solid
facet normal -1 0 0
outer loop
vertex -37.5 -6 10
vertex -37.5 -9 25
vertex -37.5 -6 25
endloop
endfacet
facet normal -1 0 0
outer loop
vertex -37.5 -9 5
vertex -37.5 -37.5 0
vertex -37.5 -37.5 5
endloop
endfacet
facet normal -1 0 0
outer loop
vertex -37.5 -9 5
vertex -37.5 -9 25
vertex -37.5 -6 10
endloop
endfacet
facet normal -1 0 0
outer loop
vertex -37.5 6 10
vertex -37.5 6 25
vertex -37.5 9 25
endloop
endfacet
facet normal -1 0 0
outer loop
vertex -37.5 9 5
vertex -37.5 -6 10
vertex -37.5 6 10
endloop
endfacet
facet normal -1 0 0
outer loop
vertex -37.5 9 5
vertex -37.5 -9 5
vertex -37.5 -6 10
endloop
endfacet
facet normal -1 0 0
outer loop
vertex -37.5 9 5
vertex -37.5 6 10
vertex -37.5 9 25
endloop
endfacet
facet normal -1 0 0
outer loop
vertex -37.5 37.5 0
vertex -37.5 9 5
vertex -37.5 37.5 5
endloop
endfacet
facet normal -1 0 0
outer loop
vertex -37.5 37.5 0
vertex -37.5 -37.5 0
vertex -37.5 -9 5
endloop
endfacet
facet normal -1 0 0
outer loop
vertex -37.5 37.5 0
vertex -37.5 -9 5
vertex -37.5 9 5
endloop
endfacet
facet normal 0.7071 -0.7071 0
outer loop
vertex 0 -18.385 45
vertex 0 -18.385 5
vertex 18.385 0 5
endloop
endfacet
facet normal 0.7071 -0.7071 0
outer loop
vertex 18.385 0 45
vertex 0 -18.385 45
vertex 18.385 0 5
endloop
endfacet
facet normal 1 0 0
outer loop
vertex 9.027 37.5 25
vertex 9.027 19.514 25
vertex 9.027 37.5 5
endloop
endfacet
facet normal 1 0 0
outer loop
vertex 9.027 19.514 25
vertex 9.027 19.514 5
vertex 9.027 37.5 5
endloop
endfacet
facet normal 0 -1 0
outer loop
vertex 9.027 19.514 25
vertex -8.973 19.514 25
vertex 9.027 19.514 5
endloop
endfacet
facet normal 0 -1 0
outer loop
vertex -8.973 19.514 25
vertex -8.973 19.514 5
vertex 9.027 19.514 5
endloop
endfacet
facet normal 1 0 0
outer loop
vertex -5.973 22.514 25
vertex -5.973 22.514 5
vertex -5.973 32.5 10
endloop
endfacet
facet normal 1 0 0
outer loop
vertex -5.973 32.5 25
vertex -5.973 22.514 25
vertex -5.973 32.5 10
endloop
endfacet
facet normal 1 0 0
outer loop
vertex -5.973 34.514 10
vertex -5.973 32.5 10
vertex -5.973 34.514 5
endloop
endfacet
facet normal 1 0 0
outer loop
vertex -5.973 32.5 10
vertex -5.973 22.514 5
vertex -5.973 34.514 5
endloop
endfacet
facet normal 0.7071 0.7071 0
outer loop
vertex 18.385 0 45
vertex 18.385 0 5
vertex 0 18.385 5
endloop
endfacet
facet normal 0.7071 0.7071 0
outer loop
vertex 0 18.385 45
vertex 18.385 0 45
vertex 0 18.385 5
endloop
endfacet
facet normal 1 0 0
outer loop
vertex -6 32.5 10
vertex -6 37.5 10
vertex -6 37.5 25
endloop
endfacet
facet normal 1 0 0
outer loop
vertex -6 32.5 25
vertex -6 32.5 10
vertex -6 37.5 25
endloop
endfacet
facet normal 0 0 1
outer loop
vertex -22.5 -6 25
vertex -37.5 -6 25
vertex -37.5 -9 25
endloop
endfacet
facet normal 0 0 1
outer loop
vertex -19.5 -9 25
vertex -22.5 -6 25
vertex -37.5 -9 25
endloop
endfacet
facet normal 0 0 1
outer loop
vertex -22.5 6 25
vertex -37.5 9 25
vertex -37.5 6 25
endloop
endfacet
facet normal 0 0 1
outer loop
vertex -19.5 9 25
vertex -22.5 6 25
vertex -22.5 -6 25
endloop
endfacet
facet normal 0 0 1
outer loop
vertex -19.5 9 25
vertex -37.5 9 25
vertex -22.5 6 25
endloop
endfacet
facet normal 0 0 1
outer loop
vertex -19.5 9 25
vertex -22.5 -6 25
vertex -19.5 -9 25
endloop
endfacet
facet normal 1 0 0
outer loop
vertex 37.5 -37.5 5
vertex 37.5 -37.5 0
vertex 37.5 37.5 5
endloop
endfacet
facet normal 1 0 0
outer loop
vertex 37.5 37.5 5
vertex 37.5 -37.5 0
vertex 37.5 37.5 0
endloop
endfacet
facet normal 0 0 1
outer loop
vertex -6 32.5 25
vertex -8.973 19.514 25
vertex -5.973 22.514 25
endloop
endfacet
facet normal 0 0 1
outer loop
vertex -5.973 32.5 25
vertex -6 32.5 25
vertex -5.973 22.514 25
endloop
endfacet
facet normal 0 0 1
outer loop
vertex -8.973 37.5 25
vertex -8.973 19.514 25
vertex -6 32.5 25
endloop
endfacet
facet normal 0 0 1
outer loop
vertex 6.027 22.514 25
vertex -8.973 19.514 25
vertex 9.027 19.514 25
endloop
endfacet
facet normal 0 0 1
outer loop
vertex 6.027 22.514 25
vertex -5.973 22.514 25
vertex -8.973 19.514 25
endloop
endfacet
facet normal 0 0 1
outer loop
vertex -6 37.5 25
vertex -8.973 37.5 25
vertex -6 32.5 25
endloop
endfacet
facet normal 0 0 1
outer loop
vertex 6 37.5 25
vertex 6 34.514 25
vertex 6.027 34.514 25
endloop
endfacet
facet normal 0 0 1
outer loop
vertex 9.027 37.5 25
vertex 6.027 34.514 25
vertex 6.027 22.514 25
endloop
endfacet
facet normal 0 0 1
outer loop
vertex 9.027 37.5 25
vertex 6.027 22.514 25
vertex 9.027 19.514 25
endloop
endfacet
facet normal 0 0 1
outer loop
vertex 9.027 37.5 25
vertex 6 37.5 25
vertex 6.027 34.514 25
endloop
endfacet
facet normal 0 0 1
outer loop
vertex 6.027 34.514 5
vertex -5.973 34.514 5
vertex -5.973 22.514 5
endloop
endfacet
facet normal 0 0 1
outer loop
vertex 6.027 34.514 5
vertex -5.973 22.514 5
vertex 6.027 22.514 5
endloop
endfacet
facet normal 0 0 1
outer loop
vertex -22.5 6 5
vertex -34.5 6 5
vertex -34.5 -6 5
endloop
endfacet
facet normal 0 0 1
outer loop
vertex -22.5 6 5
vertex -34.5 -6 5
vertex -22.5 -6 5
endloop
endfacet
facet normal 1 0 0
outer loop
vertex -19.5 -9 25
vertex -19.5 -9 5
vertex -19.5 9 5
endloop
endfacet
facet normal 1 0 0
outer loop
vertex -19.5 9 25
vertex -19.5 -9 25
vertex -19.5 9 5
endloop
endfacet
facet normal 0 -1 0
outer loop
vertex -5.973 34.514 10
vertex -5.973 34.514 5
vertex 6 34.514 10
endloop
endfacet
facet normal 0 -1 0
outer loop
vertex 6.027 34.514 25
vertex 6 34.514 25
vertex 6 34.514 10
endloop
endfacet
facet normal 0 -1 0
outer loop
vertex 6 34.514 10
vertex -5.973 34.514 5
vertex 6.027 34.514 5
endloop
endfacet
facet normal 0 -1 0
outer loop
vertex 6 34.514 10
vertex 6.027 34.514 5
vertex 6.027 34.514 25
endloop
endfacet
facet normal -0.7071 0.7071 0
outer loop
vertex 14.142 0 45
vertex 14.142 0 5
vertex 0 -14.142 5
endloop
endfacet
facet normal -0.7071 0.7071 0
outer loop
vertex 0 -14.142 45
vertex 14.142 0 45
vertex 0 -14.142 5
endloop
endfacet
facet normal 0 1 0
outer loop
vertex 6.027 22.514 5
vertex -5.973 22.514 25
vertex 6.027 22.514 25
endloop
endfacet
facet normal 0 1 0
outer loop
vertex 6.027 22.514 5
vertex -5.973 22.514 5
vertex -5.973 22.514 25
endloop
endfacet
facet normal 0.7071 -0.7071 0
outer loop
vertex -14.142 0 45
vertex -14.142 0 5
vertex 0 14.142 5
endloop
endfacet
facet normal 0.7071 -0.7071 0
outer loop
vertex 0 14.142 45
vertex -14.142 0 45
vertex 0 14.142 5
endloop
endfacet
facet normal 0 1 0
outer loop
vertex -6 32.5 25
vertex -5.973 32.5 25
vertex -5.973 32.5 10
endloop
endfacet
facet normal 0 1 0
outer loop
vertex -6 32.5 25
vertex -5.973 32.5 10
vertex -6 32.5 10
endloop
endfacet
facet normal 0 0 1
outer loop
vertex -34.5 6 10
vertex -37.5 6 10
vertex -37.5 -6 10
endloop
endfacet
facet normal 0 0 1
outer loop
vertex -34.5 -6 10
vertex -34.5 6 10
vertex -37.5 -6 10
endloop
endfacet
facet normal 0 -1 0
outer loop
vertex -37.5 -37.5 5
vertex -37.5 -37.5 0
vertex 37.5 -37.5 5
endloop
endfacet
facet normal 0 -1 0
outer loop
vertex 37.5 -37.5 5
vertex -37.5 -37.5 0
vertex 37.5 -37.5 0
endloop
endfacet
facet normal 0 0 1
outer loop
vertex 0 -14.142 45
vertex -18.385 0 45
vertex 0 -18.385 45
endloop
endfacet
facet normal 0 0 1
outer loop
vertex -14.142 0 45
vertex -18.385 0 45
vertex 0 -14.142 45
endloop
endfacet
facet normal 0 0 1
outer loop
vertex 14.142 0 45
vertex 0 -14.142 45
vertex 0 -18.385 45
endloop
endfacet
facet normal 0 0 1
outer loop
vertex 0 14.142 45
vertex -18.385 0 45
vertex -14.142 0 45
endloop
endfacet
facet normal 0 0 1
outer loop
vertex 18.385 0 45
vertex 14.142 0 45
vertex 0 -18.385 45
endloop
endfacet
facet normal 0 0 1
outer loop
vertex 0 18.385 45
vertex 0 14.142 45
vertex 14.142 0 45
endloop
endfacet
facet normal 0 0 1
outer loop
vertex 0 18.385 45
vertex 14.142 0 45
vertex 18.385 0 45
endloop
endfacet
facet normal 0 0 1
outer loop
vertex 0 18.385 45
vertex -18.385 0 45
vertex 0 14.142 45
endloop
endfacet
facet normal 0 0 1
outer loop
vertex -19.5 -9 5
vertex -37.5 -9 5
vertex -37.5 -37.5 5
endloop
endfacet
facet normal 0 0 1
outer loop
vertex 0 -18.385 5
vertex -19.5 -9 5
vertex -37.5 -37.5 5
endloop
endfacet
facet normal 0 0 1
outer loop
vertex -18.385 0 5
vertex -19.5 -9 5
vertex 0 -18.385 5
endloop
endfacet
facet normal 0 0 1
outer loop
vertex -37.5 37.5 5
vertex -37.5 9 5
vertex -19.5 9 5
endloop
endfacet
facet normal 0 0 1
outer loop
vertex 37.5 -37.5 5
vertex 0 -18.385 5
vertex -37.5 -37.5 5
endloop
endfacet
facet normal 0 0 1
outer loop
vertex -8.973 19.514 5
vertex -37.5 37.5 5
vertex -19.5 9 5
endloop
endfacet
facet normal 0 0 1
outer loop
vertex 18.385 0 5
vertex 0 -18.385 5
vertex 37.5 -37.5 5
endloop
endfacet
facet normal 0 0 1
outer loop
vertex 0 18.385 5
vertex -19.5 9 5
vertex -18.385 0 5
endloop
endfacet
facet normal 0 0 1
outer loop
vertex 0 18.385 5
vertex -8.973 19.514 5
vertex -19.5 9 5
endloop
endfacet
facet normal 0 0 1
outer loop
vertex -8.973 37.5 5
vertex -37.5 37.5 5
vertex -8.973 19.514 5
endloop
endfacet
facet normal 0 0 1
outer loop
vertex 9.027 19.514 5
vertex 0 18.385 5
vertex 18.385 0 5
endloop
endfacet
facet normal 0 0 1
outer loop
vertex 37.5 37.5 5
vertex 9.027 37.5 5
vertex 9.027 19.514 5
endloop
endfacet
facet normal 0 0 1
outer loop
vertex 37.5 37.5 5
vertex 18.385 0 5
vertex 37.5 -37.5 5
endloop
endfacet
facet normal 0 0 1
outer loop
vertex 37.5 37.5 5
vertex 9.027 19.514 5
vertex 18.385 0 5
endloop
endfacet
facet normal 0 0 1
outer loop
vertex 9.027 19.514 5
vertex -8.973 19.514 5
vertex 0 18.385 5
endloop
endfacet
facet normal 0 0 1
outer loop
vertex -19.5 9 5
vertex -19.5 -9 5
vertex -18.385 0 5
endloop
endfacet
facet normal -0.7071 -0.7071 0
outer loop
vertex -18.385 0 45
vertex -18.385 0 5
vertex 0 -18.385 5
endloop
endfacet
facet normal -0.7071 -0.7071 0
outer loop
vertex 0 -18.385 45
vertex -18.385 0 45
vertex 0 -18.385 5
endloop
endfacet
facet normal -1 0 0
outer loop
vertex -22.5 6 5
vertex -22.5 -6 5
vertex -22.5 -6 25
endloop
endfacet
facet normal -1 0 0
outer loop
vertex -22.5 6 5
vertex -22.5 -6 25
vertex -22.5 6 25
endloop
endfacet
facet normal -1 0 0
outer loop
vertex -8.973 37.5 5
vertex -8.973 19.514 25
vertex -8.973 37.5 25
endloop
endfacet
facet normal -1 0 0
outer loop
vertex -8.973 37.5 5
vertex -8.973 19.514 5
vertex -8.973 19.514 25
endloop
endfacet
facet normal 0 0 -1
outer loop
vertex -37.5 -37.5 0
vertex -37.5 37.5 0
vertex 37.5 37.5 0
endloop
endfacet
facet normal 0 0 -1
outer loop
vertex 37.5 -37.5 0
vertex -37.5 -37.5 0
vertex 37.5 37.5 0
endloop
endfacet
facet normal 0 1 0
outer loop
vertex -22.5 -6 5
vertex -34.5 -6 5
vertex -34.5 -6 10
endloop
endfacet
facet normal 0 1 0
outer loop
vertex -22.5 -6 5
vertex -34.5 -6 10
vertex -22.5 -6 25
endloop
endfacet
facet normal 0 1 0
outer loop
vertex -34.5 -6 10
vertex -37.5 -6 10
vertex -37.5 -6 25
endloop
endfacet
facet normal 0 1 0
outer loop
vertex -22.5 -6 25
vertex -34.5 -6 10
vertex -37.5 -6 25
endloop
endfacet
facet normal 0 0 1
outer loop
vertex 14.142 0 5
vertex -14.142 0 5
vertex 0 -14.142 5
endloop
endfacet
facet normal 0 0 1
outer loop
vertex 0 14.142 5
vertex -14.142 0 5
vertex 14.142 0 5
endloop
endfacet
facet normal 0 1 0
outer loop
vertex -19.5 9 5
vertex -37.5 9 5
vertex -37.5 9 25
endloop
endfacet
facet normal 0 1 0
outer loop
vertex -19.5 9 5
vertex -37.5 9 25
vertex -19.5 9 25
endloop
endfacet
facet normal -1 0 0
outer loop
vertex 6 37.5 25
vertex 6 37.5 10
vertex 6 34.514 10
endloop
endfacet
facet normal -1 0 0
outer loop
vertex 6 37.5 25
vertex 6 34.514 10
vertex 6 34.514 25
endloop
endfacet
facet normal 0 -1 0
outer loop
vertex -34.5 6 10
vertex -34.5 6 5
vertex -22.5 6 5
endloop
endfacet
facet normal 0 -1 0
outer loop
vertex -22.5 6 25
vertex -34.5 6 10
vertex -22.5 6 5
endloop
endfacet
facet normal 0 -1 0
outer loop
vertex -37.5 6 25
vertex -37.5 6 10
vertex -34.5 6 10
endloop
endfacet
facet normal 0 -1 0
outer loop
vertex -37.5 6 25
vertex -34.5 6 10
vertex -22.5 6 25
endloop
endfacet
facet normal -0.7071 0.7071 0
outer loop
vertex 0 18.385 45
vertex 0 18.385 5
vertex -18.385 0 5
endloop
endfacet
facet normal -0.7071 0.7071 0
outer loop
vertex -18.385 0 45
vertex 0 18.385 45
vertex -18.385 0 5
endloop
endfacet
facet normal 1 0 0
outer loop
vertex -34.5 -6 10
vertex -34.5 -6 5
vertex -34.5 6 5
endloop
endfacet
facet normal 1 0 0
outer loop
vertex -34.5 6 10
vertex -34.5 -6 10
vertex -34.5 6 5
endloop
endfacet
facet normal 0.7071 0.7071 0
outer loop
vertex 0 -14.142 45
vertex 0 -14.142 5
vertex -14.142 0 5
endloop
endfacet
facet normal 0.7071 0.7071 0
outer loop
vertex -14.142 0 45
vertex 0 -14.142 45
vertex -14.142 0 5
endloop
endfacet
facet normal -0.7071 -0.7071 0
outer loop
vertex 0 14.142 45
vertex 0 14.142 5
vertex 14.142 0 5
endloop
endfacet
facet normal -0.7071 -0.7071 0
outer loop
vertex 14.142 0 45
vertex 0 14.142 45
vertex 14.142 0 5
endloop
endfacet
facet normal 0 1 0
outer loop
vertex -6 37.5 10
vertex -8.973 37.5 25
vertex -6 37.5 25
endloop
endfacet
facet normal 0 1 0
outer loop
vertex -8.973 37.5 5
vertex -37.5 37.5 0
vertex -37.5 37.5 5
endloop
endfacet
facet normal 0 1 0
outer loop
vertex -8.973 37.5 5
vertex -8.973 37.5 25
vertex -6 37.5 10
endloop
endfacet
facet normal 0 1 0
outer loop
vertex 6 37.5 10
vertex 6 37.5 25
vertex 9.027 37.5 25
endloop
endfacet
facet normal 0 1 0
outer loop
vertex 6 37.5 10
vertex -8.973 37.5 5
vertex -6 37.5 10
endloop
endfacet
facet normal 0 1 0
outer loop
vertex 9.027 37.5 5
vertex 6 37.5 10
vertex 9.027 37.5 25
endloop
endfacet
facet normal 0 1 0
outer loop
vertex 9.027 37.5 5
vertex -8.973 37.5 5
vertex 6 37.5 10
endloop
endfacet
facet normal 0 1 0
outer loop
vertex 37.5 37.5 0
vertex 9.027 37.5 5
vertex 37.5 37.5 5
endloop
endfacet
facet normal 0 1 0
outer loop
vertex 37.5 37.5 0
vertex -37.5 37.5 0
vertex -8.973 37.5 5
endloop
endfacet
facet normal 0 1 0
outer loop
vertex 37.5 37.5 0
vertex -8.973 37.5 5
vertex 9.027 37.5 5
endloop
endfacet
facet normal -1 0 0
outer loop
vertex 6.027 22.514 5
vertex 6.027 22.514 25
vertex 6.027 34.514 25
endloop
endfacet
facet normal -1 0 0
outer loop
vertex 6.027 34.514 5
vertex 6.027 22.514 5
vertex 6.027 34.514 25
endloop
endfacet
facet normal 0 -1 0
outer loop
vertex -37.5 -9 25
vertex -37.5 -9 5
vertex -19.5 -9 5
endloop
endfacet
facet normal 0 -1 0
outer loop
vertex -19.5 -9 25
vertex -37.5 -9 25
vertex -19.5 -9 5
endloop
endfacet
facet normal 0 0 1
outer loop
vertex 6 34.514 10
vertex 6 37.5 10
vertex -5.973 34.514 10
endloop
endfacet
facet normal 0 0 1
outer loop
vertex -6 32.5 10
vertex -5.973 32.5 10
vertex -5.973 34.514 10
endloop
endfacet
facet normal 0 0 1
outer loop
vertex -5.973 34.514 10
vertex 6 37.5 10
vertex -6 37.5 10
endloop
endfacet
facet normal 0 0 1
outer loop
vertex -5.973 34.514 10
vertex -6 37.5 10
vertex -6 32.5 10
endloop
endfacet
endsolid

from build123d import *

# Parameters (mm, degrees)
F0_W      = 75
F0_H      = 75
F1_DEPTH  = 5
F3_DEPTH  = 40
F4_W      = 18
F4_H      = 17.9855290949
F4_W_2    = 12
F4_H_2    = 12
F4_H_3    = 18
F5_DEPTH  = 5
F6_DEPTH  = 15
F7_W      = 12
F7_H      = 15
F8_DEPTH  = 5
F9_W      = 12
F9_H      = 15
F10_DEPTH = 5


with BuildPart() as f1:
    # F0 (on Top) → F1 (new body)
    with BuildSketch(Plane.XY):
        Rectangle(F0_W, F0_H)
    extrude(amount=F1_DEPTH)

    # F2 (on face) → F3 (join)
    with BuildSketch(Plane.XY.offset(5)):
        Polygon((18.3847763109, 0), (0, 18.3847763109), (-18.3847763109, 0), (0, -18.3847763109), align=None)
        Polygon((-14.1421356237, 0), (0, 14.1421356237), (14.1421356237, 0), (0, -14.1421356237), align=None, mode=Mode.SUBTRACT)
    extrude(amount=F3_DEPTH)

    # F4 (on face) → F5 (join)
    with BuildSketch(Plane.XY.offset(5)):
        with Locations((0.0273990361, 28.5072354525)):
            Rectangle(F4_W, F4_H)
        with Locations((0.0273990361, 28.5144709051)):
            Rectangle(F4_W_2, F4_H_2, mode=Mode.SUBTRACT)
        with Locations((-28.5, 0)):
            Rectangle(F4_W, F4_H_3)
        with Locations((-28.5, 0)):
            Rectangle(F4_W_2, F4_H_2, mode=Mode.SUBTRACT)
    extrude(amount=F5_DEPTH)

    # F6 (add): faces of the model
    f6_faces = [f1.faces().sort_by_distance(p)[0] for p in [
        (8.772942899, 28.5072354525, 10),
        (-28.5, 8.7454415588, 10),
        (-28.5, 8.7454415588, 10),
    ]]
    extrude(f6_faces, amount=F6_DEPTH)

    # F7 (on face) → F8 (cut)
    with BuildSketch(Plane(origin=(-37.5, 0, 0), x_dir=(0, -1, 0), z_dir=(-1, 0, 0))):
        with Locations((0, 17.5)):
            Rectangle(F7_W, F7_H)
    extrude(amount=-F8_DEPTH, mode=Mode.SUBTRACT)

    # F9 (on face) → F10 (cut)
    with BuildSketch(Plane(origin=(0, 37.5, 0), x_dir=(-1, 0, 0), z_dir=(0, 1, 0))):
        with Locations((0, 17.5)):
            Rectangle(F9_W, F9_H)
    extrude(amount=-F10_DEPTH, mode=Mode.SUBTRACT)


solid = f1.part
